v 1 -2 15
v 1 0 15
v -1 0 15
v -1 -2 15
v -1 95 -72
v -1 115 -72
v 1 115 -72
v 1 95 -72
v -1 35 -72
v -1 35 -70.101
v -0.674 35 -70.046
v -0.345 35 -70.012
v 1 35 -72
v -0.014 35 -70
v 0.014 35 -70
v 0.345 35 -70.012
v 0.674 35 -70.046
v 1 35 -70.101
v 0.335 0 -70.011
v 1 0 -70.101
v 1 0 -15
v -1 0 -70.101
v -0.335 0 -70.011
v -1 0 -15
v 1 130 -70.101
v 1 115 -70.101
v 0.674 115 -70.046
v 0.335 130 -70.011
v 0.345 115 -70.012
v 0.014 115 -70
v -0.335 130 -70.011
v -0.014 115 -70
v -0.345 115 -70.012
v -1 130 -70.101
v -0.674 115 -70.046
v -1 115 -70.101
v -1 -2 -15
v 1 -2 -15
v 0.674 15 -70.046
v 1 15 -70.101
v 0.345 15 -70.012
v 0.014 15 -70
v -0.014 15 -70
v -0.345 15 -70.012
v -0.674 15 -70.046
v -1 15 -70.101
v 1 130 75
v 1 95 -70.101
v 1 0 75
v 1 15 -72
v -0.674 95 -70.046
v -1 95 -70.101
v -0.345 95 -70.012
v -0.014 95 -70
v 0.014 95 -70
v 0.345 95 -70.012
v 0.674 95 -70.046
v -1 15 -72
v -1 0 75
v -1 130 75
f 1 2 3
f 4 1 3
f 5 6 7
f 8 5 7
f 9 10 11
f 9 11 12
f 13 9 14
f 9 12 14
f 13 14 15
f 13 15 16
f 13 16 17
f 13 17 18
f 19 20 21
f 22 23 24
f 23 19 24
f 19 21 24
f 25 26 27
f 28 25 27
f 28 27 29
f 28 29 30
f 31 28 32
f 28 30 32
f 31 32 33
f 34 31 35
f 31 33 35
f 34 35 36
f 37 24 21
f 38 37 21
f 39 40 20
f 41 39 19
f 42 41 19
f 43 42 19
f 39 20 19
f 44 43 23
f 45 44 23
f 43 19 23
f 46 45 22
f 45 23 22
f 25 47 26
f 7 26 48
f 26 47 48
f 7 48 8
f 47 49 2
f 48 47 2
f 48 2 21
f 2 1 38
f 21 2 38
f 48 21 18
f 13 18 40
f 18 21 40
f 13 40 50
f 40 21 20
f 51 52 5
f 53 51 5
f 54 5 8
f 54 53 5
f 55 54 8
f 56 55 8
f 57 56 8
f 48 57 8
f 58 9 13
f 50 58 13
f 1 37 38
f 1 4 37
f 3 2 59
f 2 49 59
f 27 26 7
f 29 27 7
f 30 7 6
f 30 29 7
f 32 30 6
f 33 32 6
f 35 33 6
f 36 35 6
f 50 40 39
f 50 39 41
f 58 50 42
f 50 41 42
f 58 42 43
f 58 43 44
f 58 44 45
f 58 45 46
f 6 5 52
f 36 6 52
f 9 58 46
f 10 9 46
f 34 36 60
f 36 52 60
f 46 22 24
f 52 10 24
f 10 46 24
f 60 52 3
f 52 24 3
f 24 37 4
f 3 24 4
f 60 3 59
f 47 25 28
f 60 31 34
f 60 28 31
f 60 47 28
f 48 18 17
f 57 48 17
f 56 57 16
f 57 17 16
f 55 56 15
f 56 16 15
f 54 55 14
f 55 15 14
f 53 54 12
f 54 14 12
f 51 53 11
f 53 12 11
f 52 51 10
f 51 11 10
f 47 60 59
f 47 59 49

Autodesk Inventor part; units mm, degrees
ref_plane "YZ Plane" through (0, 0, 0) normal (1, 0, 0) x (0, 1, 0)
sketch "Sketch1" plane through (0, 0, 0) normal (0, 1, 0) x (-1, 0, 0)
  line L0 (1, 75) -> (-1, 75)
  line L1 (-1, 75) -> (-1, -70.101)
  line L2 (-1, -75) -> (0, -75) construction
  line L3 (1, -75) -> (1, -70.101) construction
  line L4 (0, 75) -> (0, -75) construction
  arc A0 (1, -70.101) -> (-1, -70.101) centre (0, -75) ccw
  arc A1 (-1, -70.101) -> (1, -70.101) centre (0, -75) ccw construction
  line L5 (1, -70.101) -> (1, 75)
  line L6 (0, -75) -> (1, -75) construction
  line L7 (-1, -70.101) -> (-1, -75) construction
  point P0 (0, 0)
  point P1 (0, 0)
  dimension "d0" = 2
  dimension "d1" = 150
  dimension "d18" = 10
extrude "Extrusion1" add sketch "Sketch1" along normal blind 130
ref_plane "Work Plane2" through (0, 0, 0) normal (0, -1, 0) x (1, 0, 0)
sketch "Sketch2" plane through (0, 0, 0) normal (0, -1, 0) x (1, 0, 0)
  line L0 (1, 15) -> (-1, 15)
  line L1 (-1, 15) -> (-1, -15)
  line L2 (-1, -15) -> (1, -15)
  line L3 (1, -15) -> (1, 15)
  line L4 (0, 15) -> (0, -15) construction
  point P0 (0, 0)
  point P1 (0, 0)
  dimension "d5" = 2
  dimension "d6" = 30
extrude "Extrusion2" add sketch "Sketch2" along normal blind 2
ref_plane "Work Plane4" through (1, 0, -70) normal (0, 0, 1) x (1, 0, 0)
sketch "Sketch4" plane through (1, 0, -70) normal (0, 0, 1) x (1, 0, 0)
  line L0 (0, 115) -> (-2, 115)
  line L1 (-2, 115) -> (-2, 95)
  line L2 (-2, 95) -> (0, 95)
  line L3 (0, 95) -> (0, 115)
  line L4 (-1, 115) -> (-1, 95) construction
  line L5 (-1, 0) -> (-1, 130) construction
  line L6 (-2, 130) -> (0, 130) construction
  line L7 (-2, 35) -> (0, 35)
  line L8 (0, 35) -> (0, 15)
  line L9 (0, 15) -> (-2, 15)
  line L10 (-2, 15) -> (-2, 35)
  line L11 (-1, 35) -> (-1, 15) construction
  line L12 (-2, 0) -> (0, 0) construction
  dimension "d20" = 2
  dimension "d21" = 20
  dimension "d22" = 15
  dimension "d23" = 2
  dimension "d24" = 20
  dimension "d25" = 15
extrude "Extrusion4" add sketch "Sketch4" against normal blind 2
properties part number "sidePlate" material "Aluminum 6061"
